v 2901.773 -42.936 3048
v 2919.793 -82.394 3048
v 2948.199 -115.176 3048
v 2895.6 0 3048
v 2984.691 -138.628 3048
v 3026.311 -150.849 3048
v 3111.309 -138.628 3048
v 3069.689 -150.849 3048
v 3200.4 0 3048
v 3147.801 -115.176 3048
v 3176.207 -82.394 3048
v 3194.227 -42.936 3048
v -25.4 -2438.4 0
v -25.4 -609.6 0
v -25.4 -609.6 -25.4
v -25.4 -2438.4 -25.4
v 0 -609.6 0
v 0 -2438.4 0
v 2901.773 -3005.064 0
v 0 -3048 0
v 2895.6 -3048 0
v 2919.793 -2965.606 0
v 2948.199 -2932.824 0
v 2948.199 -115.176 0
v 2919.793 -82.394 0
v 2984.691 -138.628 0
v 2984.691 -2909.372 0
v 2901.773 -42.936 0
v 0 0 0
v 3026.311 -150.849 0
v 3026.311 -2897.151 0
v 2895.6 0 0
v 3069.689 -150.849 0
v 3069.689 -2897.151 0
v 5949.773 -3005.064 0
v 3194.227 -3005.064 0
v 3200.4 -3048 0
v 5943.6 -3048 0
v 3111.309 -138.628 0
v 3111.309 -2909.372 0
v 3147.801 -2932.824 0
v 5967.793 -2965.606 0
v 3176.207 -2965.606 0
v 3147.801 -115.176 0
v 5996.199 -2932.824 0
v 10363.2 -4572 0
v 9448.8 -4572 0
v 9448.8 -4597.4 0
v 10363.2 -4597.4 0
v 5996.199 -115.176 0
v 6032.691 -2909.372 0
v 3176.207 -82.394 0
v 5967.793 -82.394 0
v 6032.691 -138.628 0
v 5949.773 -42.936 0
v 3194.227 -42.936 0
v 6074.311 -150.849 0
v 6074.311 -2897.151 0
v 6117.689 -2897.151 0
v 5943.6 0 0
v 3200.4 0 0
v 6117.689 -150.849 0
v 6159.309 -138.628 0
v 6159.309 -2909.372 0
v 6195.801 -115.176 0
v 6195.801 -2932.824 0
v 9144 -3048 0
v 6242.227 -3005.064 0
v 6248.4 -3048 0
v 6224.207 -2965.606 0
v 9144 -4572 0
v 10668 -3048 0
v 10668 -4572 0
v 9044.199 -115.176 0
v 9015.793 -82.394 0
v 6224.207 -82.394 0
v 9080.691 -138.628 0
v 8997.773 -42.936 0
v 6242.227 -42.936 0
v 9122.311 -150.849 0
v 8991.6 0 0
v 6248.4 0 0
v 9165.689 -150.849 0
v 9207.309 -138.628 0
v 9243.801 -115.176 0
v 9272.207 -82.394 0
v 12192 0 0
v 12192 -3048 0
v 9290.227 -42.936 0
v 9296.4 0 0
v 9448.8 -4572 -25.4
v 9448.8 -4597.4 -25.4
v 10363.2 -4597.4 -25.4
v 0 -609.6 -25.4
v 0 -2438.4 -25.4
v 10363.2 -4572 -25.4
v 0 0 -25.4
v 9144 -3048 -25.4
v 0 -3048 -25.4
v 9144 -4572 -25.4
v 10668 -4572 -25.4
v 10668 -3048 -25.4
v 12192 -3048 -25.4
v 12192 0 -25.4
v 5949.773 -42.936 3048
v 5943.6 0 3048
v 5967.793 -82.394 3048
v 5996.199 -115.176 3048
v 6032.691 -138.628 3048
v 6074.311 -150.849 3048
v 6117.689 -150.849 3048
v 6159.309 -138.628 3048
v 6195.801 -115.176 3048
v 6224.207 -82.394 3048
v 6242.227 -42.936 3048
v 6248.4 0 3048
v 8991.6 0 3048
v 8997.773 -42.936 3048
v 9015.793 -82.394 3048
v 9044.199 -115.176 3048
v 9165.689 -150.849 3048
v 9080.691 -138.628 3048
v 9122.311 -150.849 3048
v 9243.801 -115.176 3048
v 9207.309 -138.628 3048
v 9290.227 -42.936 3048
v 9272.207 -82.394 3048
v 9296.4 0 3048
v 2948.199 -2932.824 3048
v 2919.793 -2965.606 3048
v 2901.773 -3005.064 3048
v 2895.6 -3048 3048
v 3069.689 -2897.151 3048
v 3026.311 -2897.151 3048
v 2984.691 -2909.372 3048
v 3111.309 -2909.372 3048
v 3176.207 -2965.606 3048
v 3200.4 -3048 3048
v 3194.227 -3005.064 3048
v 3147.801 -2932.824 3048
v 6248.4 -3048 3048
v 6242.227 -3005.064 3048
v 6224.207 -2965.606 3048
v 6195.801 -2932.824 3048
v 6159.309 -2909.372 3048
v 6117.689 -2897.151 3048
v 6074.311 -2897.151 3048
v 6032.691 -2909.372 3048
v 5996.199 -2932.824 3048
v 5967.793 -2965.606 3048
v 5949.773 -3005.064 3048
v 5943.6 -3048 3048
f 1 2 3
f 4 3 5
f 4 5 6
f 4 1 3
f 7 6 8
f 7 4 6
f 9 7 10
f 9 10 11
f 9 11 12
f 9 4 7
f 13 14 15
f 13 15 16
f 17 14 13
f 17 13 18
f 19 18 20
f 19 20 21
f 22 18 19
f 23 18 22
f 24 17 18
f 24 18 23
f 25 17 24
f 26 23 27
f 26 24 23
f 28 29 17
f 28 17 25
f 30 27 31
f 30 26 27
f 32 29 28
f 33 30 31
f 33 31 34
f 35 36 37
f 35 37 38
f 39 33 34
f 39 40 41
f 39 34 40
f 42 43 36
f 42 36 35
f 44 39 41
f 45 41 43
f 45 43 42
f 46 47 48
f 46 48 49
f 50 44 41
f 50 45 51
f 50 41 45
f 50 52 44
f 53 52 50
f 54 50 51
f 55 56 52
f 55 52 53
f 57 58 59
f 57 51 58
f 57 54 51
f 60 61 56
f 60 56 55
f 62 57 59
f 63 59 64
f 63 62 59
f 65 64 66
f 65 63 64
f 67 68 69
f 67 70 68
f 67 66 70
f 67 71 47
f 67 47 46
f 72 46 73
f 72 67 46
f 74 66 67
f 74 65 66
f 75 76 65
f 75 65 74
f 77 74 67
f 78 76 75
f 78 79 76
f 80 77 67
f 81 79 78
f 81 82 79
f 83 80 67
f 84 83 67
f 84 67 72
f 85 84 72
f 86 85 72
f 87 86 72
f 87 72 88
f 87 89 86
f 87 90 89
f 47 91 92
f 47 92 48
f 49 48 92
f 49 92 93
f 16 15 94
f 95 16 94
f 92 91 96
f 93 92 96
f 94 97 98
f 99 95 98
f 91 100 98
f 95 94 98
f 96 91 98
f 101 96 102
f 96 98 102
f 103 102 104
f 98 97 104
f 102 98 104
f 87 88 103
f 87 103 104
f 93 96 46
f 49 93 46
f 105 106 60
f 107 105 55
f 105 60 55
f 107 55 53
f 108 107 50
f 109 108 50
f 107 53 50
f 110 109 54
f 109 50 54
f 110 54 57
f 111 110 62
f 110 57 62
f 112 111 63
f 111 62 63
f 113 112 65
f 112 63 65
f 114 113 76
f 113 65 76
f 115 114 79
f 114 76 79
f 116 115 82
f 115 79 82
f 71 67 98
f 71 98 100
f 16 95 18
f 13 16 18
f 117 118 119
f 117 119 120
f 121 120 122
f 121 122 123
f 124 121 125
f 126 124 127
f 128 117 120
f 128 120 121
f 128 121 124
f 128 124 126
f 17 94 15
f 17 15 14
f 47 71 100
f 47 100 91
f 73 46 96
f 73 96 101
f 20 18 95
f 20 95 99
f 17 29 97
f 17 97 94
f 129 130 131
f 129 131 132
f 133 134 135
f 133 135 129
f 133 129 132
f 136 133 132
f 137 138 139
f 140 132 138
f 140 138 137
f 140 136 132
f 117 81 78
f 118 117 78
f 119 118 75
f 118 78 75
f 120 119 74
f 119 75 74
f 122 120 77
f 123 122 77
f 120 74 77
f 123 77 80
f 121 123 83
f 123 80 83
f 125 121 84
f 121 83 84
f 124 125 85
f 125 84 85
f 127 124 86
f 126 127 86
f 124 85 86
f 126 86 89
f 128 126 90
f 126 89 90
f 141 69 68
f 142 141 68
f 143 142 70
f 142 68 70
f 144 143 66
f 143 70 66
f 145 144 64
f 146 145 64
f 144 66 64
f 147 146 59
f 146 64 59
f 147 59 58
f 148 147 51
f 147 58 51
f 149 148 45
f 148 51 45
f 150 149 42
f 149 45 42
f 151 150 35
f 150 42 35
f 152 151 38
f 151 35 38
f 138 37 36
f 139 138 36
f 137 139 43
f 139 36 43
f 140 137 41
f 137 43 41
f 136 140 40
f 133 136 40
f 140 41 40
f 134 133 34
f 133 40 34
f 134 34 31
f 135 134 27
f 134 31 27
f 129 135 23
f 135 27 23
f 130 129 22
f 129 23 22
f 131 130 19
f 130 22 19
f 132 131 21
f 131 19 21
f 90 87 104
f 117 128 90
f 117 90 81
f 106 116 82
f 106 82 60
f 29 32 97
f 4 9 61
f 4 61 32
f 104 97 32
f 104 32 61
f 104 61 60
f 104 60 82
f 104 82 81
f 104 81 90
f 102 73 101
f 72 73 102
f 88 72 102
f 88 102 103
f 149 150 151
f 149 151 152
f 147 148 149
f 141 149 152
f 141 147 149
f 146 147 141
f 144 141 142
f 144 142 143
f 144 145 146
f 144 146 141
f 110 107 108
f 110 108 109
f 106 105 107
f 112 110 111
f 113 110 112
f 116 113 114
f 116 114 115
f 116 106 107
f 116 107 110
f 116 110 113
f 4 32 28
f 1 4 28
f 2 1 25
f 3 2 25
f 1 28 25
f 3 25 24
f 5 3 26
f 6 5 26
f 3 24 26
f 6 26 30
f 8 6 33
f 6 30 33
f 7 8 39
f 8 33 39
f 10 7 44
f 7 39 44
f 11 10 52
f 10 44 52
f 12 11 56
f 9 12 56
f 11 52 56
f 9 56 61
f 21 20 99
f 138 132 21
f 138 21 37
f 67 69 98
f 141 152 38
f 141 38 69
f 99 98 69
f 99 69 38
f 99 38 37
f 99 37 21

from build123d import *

# Parameters (mm, degrees)
F1_DEPTH = 25.4
F2_DEPTH = 3048
F3_W     = 914.4
F3_H     = 25.4
F4_DEPTH = 25.4
F5_W     = 1828.8
F5_H     = 25.4
F6_DEPTH = 25.4


with BuildPart() as f1:
    # F0 (on Top) → F1 (new body)
    with BuildSketch(Plane.XY):
        with BuildLine():
            Line((2895.6, 0), (0, 0))
            Line((0, 0), (0, -3048))
            Line((0, -3048), (2895.6, -3048))
            ThreePointArc((2895.6, -3048), (3048, -2895.6), (3200.4, -3048))
            Line((3200.4, -3048), (5943.6, -3048))
            ThreePointArc((5943.6, -3048), (6096, -2895.6), (6248.4, -3048))
            Line((6248.4, -3048), (9144, -3048))
            Line((9144, -3048), (9144, -4572))
            Line((9144, -4572), (10668, -4572))
            Line((10668, -4572), (10668, -3048))
            Line((10668, -3048), (12192, -3048))
            Line((12192, -3048), (12192, 0))
            Line((12192, 0), (9296.4, 0))
            ThreePointArc((9296.4, 0), (9144, -152.4), (8991.6, 0))
            Line((8991.6, 0), (6248.4, 0))
            ThreePointArc((6248.4, 0), (6096, -152.4), (5943.6, 0))
            Line((5943.6, 0), (3200.4, 0))
            ThreePointArc((3200.4, 0), (3048, -152.4), (2895.6, 0))
        make_face()
        with BuildLine():
            Line((3200.4, 0), (2895.6, 0))
            ThreePointArc((2895.6, 0), (3048, -152.4), (3200.4, 0))
        make_face()
        with BuildLine():
            ThreePointArc((3200.4, -3048), (3048, -2895.6), (2895.6, -3048))
            Line((2895.6, -3048), (3200.4, -3048))
        make_face()
        with BuildLine():
            Line((6248.4, 0), (5943.6, 0))
            ThreePointArc((5943.6, 0), (6096, -152.4), (6248.4, 0))
        make_face()
        with BuildLine():
            ThreePointArc((6248.4, -3048), (6096, -2895.6), (5943.6, -3048))
            Line((5943.6, -3048), (6248.4, -3048))
        make_face()
        with BuildLine():
            Line((9296.4, 0), (8991.6, 0))
            ThreePointArc((8991.6, 0), (9144, -152.4), (9296.4, 0))
        make_face()
    extrude(amount=-F1_DEPTH)

    # F0 (on Top) → F2 (join)
    with BuildSketch(Plane.XY):
        with BuildLine():
            Line((3200.4, 0), (2895.6, 0))
            ThreePointArc((2895.6, 0), (3048, -152.4), (3200.4, 0))
        make_face()
        with BuildLine():
            Line((6248.4, 0), (5943.6, 0))
            ThreePointArc((5943.6, 0), (6096, -152.4), (6248.4, 0))
        make_face()
        with BuildLine():
            ThreePointArc((3200.4, -3048), (3048, -2895.6), (2895.6, -3048))
            Line((2895.6, -3048), (3200.4, -3048))
        make_face()
        with BuildLine():
            ThreePointArc((6248.4, -3048), (6096, -2895.6), (5943.6, -3048))
            Line((5943.6, -3048), (6248.4, -3048))
        make_face()
        with BuildLine():
            Line((9296.4, 0), (8991.6, 0))
            ThreePointArc((8991.6, 0), (9144, -152.4), (9296.4, 0))
        make_face()
    extrude(amount=F2_DEPTH)

    # F3 (on face) → F4 (join)
    with BuildSketch(Plane.XZ.offset(4572)):
        with Locations((9906, -12.7)):
            Rectangle(F3_W, F3_H)
    extrude(amount=F4_DEPTH)

    # F5 (on face) → F6 (join)
    with BuildSketch(Plane(origin=(0, 0, 0), x_dir=(0, -1, 0), z_dir=(-1, 0, 0))):
        with Locations((1524, -12.7)):
            Rectangle(F5_W, F5_H)
    extrude(amount=F6_DEPTH)


solid = f1.part
